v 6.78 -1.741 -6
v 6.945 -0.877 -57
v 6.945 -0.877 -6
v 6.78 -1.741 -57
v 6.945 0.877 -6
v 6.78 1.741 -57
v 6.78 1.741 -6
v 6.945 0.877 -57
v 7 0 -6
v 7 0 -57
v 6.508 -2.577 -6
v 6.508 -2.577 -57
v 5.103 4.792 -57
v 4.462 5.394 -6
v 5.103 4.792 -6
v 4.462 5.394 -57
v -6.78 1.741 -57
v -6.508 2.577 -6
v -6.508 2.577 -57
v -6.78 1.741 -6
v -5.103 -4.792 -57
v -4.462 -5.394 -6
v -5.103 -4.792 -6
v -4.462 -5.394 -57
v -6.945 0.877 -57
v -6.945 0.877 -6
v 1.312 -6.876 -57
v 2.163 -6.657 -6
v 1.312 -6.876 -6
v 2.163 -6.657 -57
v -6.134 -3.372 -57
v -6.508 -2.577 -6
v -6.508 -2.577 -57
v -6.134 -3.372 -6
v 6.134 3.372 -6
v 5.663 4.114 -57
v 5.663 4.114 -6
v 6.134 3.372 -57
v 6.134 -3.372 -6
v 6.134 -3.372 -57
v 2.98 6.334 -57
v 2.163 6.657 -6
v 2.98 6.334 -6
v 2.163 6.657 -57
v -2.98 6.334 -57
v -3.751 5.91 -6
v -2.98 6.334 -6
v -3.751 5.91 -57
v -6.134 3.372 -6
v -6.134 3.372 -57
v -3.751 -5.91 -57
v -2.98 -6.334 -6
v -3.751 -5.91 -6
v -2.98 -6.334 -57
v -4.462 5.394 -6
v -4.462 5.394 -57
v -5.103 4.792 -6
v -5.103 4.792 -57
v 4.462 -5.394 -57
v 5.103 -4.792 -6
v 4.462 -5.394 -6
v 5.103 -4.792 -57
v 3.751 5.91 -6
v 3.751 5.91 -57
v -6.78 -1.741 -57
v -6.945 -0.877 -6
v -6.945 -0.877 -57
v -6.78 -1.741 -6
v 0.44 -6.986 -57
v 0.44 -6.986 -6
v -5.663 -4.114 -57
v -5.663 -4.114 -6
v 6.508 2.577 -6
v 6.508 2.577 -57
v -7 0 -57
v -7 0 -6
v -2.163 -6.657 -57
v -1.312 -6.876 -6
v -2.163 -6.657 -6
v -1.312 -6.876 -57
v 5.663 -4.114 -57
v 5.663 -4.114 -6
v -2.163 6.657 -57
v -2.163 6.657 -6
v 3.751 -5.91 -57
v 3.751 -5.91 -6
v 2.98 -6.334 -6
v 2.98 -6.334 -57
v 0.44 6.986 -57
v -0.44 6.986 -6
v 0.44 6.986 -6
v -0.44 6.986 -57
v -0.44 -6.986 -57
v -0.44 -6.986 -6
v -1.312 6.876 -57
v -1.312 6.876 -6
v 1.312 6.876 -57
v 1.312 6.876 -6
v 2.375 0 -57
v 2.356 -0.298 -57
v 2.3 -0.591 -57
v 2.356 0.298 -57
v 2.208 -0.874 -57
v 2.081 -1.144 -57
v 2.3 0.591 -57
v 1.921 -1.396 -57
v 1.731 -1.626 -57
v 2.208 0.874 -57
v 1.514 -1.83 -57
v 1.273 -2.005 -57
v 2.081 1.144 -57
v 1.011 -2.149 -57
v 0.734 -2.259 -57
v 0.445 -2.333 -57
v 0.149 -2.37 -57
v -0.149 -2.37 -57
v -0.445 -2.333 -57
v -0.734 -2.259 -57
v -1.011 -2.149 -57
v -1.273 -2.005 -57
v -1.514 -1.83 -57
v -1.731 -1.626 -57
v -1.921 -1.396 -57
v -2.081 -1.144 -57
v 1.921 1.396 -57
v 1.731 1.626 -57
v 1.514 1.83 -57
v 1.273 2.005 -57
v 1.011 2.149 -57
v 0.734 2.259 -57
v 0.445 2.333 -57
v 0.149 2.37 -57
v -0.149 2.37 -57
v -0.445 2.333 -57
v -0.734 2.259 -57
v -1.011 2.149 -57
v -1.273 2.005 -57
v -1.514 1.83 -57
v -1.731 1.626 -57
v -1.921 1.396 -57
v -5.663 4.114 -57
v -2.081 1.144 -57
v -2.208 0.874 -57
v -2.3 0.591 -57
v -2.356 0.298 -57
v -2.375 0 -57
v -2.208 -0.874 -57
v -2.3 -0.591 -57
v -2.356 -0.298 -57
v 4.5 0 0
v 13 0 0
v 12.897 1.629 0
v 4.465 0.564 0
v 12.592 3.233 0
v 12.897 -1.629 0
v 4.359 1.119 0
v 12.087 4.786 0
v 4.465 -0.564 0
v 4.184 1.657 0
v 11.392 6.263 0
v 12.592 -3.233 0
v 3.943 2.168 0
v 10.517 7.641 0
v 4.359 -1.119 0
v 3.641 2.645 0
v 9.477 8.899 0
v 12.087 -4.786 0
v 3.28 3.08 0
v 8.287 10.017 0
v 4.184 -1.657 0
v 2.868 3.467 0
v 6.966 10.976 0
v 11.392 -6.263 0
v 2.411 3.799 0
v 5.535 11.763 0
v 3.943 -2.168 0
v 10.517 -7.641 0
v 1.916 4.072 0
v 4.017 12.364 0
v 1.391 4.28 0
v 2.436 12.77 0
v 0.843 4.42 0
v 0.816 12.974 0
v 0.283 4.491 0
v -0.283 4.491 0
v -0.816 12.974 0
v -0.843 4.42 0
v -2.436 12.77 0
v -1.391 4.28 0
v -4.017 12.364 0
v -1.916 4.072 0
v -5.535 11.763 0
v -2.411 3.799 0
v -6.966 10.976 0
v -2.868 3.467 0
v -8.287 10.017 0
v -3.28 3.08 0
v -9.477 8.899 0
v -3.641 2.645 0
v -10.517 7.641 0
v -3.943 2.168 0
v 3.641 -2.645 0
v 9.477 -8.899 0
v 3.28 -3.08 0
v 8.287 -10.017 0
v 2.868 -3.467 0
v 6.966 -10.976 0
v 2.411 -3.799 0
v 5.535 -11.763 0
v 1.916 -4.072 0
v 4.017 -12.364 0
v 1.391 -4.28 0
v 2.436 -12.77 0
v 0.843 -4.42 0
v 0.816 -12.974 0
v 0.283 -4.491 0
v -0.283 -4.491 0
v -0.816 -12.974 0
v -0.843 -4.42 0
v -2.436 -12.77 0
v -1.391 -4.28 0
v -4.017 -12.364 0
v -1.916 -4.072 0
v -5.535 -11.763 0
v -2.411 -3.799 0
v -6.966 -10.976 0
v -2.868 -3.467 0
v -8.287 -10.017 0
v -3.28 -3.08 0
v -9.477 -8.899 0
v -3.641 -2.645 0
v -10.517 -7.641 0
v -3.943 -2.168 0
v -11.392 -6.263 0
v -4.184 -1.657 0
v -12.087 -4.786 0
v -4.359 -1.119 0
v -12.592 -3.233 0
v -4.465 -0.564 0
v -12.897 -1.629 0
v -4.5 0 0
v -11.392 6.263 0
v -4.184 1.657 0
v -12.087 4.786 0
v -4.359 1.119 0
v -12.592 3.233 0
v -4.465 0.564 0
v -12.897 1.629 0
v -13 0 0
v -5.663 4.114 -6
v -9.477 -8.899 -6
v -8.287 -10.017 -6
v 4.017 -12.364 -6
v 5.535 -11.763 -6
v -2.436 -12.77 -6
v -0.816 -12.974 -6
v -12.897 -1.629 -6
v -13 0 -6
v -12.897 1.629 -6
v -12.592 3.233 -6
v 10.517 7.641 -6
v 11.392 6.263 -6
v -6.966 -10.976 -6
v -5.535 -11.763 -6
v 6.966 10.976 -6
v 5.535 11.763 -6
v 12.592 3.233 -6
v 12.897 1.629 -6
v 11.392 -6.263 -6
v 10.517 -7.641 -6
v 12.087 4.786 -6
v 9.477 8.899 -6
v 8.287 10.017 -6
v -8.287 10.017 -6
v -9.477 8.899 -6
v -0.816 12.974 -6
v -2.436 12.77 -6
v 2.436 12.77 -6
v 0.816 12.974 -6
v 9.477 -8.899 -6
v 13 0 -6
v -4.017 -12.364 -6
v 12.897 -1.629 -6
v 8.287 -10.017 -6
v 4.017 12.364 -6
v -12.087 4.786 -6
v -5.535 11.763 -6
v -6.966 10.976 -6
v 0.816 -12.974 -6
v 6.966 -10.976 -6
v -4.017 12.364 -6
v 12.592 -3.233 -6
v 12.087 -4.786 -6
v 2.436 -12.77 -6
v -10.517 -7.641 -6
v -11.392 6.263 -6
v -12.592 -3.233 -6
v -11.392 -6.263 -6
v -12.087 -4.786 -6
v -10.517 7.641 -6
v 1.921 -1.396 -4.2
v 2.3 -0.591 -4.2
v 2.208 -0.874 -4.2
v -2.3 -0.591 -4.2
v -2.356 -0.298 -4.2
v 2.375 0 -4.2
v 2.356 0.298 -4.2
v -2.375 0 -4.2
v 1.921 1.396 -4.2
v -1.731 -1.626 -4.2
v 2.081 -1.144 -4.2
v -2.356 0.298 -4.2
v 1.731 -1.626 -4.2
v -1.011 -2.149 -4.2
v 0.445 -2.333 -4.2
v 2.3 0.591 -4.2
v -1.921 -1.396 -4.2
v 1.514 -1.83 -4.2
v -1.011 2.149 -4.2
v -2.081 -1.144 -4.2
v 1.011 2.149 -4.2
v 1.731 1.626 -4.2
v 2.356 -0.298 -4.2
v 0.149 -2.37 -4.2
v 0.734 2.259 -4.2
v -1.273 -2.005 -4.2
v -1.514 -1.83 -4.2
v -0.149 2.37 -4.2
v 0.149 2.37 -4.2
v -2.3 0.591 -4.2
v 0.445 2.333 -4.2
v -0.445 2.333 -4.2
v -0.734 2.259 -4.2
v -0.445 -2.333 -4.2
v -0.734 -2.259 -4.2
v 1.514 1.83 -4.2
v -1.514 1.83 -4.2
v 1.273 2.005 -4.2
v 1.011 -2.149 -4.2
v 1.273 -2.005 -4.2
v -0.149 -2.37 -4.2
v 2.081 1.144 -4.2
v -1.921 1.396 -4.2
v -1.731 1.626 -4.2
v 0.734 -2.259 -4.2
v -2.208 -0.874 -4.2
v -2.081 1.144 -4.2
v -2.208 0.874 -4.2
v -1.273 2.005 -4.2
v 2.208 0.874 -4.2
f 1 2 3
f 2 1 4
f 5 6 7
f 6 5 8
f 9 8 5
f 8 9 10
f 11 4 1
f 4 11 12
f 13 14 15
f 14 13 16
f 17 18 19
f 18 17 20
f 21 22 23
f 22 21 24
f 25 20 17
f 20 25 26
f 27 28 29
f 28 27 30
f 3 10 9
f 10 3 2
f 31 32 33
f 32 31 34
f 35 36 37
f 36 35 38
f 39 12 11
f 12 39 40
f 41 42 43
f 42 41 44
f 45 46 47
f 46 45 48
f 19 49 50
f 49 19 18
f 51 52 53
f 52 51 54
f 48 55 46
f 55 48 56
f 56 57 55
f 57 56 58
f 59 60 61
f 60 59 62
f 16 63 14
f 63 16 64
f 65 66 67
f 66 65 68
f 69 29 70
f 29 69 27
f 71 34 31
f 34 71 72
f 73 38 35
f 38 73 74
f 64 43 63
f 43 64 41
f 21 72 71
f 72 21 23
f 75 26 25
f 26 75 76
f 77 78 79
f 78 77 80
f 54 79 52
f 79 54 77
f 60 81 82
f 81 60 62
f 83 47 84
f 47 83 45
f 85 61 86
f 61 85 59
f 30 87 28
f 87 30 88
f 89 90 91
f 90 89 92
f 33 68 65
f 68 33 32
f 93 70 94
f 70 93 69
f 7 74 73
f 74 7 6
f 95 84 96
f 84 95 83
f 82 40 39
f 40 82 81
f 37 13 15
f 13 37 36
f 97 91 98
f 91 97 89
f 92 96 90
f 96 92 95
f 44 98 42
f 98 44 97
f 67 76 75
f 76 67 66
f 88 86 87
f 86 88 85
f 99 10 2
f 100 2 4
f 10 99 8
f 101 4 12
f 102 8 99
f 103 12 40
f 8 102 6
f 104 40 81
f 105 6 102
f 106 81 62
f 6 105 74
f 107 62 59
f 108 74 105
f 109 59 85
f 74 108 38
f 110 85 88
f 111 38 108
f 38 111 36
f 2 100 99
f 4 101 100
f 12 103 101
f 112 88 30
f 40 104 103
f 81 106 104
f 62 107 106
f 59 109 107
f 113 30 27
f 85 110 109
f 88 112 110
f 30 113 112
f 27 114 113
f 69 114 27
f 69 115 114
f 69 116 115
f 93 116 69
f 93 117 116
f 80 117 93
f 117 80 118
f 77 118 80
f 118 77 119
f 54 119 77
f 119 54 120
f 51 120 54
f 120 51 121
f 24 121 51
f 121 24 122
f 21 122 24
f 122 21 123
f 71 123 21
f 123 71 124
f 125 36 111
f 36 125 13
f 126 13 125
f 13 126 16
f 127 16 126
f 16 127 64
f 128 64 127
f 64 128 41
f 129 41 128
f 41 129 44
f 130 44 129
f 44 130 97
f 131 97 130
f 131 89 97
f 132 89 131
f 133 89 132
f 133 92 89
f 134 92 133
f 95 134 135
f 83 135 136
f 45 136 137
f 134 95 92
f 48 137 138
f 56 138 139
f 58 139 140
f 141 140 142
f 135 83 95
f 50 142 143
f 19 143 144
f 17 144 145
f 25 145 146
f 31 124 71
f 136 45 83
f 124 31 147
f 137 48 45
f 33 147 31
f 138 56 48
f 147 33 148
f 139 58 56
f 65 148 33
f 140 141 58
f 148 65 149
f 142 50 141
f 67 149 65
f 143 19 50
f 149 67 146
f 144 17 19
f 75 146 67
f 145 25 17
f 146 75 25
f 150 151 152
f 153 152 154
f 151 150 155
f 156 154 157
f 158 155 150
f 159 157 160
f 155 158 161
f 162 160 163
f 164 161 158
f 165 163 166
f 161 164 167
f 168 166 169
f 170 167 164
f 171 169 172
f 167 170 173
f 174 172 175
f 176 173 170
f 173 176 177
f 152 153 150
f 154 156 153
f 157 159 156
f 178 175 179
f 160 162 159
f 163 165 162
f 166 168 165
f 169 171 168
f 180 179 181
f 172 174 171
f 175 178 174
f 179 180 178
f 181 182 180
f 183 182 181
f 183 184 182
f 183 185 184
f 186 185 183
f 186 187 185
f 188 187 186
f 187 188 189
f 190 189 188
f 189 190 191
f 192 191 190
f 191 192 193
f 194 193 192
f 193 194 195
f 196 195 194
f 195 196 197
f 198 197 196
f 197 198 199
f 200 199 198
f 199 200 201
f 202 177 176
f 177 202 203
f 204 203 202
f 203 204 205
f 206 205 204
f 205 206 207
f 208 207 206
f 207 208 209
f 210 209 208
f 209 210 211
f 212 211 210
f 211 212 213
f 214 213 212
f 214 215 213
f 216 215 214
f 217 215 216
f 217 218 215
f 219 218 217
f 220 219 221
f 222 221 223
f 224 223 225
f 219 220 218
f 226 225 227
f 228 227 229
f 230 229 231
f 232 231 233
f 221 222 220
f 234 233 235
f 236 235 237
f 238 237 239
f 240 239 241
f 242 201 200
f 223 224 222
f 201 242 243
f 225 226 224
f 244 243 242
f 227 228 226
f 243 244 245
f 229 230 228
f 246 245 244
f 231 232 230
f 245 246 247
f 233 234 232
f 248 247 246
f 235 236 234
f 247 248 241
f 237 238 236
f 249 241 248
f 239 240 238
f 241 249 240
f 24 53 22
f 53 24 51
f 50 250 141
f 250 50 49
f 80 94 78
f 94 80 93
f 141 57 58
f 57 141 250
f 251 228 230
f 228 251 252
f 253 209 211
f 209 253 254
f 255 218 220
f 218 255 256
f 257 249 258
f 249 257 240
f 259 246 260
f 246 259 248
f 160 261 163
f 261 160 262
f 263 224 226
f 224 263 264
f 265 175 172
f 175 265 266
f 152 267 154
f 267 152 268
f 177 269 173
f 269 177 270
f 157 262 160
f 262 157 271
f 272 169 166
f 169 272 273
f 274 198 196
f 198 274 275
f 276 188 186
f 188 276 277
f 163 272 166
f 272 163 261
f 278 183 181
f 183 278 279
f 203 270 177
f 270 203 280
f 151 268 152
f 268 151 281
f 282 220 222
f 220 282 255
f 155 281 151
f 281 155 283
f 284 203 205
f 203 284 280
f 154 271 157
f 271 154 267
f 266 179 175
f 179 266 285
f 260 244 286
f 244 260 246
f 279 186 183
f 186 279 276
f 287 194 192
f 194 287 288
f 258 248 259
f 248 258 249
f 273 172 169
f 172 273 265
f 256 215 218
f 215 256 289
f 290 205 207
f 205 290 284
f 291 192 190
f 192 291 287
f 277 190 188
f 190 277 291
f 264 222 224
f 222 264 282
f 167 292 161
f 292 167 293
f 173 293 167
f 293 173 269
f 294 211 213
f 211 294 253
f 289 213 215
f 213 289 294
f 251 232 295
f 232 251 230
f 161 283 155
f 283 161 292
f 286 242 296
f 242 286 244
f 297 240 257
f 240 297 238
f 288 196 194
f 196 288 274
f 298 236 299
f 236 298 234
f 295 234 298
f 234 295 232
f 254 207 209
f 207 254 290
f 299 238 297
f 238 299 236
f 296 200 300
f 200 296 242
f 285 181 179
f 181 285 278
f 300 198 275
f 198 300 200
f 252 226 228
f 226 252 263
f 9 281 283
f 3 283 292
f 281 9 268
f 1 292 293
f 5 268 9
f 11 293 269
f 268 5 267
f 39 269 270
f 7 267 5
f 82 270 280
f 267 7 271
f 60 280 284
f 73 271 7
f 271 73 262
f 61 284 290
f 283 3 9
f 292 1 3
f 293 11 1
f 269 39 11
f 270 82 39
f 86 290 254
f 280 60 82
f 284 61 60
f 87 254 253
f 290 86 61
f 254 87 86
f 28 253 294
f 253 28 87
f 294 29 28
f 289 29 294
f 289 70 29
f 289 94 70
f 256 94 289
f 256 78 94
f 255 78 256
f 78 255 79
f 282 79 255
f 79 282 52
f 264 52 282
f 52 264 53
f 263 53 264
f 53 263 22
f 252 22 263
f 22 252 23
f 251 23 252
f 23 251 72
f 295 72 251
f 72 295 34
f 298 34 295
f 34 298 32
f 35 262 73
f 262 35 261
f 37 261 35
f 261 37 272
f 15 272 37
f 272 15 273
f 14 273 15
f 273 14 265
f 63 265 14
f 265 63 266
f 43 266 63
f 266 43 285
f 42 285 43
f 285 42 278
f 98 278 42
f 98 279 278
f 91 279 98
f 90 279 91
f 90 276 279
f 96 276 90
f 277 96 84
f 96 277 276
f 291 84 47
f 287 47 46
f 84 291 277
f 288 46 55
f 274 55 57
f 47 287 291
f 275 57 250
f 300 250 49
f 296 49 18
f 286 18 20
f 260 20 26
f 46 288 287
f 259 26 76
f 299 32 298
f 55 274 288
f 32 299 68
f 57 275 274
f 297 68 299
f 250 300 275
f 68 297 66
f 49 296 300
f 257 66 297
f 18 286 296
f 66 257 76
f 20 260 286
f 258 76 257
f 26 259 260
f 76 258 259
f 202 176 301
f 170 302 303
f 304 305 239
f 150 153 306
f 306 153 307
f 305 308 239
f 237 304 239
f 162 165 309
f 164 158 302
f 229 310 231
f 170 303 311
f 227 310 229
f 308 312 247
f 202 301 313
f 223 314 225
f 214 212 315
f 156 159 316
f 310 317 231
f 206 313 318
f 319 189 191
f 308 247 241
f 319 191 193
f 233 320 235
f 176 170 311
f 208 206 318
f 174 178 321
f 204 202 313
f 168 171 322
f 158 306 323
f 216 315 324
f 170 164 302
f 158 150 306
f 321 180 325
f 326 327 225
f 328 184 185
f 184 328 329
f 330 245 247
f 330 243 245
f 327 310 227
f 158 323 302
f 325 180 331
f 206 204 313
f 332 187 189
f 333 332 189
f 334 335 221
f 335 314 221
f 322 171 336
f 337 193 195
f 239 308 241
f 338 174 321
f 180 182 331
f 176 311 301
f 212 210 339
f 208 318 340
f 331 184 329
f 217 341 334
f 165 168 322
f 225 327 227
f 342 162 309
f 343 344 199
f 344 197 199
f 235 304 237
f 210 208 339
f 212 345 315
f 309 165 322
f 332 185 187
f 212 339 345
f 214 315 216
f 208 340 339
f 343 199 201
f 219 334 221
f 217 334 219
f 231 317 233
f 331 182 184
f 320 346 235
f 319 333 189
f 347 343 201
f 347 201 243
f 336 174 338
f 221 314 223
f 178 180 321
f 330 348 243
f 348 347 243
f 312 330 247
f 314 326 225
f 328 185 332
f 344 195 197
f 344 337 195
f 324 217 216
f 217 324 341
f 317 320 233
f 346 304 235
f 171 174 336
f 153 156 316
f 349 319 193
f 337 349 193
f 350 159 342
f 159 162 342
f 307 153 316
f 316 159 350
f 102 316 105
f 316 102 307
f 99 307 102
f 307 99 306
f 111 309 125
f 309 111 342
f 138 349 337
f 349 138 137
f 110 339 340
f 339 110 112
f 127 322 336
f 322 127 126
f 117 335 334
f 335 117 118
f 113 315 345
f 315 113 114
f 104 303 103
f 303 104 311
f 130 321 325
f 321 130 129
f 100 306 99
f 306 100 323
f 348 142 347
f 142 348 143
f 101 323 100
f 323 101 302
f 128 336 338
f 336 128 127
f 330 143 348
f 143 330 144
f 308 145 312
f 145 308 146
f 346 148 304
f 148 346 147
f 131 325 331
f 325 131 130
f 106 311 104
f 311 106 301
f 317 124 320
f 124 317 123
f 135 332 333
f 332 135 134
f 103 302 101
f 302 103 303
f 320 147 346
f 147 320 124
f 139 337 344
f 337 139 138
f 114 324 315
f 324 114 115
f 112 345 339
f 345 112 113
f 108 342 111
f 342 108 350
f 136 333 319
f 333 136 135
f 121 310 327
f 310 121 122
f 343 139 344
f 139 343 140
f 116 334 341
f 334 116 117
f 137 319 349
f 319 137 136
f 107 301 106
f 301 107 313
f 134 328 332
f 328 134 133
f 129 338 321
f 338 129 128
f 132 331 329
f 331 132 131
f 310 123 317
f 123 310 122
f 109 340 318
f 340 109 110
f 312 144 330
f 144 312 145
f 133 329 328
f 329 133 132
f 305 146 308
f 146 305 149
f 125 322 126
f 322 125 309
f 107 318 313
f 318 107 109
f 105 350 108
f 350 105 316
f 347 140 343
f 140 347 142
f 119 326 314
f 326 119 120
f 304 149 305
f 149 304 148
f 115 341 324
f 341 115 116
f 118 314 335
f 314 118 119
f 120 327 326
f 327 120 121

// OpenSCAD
$fn = 50;


difference() {
	union() {
		translate(v = [0, 0, -57.0000000000]) {
			cylinder(h = 57, r = 7.0000000000);
		}
		translate(v = [0, 0, -6.0000000000]) {
			cylinder(h = 6, r = 13.0000000000);
		}
	}
	union() {
		translate(v = [0, 0, 0]) {
			rotate(a = [0, 0, 0]) {
				difference() {
					union() {
						#translate(v = [0, 0, -57.0000000000]) {
							cylinder(h = 57, r = 2.2500000000);
						}
						#translate(v = [0, 0, -4.2000000000]) {
							cylinder(h = 4.2000000000, r1 = 2.3750000000, r2 = 4.5000000000);
						}
						#translate(v = [0, 0, -57.0000000000]) {
							cylinder(h = 57, r = 2.3750000000);
						}
						#translate(v = [0, 0, -57.0000000000]) {
							cylinder(h = 57, r = 2.2500000000);
						}
					}
					union();
				}
			}
		}
	}
}
